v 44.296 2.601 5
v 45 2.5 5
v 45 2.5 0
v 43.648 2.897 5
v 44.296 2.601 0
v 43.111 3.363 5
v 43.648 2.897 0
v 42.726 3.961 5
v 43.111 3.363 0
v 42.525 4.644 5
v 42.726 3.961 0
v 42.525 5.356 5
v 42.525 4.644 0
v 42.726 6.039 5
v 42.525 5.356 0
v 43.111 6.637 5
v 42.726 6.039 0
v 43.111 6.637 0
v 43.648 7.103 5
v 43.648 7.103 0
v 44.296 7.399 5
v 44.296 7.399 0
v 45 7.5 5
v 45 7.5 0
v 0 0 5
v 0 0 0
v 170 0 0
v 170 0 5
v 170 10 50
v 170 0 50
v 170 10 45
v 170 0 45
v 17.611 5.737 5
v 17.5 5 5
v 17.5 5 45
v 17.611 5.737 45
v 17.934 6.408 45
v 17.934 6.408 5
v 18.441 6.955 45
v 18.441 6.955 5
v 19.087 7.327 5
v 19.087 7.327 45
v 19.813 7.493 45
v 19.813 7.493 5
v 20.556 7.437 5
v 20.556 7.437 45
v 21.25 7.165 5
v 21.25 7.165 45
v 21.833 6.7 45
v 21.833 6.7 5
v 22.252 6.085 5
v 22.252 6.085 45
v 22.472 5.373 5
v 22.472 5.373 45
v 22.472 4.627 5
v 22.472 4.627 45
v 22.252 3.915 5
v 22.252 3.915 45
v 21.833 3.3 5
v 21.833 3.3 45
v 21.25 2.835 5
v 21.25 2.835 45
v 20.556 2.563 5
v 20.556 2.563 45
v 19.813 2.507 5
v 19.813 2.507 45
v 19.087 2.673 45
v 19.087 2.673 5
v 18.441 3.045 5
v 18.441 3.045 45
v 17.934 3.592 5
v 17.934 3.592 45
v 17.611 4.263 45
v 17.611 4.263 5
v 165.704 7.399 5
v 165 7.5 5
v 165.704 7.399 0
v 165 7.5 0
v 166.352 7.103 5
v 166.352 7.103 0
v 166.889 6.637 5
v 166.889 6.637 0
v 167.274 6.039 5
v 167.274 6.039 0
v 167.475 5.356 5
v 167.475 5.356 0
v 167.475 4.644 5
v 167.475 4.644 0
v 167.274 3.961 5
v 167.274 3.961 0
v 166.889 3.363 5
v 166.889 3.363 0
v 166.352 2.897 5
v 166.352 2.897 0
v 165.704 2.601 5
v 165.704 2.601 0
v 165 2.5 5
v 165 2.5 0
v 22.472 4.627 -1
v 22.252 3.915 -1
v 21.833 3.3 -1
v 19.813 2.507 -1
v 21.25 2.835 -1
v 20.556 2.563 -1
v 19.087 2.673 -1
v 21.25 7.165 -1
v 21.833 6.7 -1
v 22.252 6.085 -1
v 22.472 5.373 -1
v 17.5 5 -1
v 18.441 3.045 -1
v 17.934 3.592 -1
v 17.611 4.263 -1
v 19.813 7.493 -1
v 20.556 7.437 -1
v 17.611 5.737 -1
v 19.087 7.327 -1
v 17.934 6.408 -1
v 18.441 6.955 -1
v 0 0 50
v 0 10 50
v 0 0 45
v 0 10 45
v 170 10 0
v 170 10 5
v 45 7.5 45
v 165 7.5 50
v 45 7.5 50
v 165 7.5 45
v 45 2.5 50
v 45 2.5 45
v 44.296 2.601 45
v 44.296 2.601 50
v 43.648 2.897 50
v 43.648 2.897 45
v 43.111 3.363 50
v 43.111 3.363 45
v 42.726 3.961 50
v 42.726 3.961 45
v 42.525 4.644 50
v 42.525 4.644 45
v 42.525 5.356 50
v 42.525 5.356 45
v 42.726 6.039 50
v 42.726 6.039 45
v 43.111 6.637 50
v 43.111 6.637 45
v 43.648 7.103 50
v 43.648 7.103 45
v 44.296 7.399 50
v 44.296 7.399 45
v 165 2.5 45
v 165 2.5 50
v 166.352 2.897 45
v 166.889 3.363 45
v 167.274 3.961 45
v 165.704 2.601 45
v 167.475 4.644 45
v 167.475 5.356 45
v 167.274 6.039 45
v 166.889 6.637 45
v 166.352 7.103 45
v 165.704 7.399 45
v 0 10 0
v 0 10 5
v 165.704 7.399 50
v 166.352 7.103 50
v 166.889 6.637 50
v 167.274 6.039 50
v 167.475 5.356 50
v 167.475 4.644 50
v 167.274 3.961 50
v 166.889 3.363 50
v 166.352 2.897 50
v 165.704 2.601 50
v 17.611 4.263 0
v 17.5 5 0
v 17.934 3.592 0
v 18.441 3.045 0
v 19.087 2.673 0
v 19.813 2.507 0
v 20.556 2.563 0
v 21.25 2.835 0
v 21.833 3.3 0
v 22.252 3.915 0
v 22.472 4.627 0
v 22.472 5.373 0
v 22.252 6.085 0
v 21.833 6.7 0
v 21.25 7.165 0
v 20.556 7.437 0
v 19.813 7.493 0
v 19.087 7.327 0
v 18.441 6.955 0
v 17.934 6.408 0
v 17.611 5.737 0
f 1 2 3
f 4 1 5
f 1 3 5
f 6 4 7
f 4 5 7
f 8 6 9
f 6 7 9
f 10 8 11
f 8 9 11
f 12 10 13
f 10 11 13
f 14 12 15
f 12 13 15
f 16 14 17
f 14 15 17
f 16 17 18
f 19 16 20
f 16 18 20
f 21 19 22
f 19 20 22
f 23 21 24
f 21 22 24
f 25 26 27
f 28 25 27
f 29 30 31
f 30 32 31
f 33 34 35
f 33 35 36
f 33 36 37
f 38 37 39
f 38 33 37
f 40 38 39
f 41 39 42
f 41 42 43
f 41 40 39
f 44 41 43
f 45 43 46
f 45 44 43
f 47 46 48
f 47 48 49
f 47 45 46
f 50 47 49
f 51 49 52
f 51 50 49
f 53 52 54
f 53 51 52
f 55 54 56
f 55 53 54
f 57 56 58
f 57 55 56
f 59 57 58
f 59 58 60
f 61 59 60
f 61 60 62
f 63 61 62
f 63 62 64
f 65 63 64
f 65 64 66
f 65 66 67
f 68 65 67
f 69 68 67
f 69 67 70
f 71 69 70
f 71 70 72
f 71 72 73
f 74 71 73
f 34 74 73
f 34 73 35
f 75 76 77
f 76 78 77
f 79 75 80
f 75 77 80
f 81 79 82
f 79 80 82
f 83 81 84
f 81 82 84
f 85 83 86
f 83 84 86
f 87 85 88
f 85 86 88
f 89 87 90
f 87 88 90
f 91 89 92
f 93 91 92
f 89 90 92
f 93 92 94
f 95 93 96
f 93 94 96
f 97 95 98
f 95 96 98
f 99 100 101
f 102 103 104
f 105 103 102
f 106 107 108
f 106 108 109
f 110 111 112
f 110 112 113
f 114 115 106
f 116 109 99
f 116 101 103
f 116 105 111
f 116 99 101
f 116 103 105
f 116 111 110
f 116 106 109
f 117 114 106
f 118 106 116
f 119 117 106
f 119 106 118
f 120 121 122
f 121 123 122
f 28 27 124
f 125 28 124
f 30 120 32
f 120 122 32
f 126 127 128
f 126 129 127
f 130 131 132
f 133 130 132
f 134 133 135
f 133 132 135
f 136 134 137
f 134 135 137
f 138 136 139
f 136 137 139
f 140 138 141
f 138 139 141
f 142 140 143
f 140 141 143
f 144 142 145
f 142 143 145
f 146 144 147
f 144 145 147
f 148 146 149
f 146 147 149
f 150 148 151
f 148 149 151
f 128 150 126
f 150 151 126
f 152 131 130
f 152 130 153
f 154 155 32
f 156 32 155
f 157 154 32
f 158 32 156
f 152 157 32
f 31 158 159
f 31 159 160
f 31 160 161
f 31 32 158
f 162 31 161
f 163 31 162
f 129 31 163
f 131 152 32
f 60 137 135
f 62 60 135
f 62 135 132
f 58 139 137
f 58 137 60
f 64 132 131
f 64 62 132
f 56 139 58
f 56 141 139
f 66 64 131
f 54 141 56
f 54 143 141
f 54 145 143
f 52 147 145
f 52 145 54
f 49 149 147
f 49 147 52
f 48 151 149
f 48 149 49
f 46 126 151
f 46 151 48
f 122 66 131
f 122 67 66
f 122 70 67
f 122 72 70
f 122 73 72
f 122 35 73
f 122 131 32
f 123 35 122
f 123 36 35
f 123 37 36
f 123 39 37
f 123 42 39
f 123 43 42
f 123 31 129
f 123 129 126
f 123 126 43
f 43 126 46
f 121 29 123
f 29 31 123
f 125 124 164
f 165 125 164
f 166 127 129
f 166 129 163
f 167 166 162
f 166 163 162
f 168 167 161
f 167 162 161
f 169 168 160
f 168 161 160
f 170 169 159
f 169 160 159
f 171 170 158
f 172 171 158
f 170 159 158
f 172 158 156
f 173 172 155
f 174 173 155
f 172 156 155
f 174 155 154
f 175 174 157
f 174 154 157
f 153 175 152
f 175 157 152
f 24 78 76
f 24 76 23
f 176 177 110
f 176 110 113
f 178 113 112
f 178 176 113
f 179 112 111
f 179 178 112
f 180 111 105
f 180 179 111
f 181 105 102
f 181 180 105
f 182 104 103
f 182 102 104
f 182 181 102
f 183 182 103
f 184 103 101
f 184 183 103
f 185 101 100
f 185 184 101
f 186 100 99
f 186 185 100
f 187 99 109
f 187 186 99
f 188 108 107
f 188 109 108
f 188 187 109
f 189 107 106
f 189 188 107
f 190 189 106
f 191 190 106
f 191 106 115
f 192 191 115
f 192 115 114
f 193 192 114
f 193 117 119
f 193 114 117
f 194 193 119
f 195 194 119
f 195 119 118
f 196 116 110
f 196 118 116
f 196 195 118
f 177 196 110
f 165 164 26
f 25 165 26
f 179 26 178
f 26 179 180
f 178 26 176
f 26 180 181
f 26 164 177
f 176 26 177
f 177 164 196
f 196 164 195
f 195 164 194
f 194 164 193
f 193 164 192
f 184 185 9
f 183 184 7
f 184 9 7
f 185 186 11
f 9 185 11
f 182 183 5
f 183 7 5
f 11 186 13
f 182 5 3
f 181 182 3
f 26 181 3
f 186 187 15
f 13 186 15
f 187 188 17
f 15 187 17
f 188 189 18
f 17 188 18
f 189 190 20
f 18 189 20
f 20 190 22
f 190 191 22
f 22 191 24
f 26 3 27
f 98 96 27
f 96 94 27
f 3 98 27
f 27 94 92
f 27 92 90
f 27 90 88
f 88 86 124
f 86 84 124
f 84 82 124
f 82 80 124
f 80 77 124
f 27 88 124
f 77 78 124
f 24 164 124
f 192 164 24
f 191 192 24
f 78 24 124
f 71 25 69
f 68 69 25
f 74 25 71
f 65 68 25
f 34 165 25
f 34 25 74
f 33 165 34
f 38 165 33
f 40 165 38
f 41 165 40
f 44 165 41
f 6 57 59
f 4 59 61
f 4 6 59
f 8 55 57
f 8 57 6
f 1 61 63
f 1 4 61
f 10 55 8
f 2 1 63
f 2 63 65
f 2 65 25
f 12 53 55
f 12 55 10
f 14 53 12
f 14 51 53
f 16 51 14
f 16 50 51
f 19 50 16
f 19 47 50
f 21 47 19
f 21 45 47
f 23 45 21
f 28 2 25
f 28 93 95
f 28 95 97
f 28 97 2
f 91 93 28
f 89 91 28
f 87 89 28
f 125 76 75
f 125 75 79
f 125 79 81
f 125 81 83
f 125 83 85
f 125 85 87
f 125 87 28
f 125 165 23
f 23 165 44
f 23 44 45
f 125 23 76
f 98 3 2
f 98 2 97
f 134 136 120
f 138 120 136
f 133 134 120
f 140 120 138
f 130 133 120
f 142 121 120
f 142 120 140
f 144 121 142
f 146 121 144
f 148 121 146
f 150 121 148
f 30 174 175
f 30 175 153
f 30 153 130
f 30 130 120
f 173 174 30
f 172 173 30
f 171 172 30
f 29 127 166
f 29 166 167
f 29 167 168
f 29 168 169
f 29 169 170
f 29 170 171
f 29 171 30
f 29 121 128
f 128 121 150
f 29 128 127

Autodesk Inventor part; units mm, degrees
ref_plane "YZ Plane" through (0, 0, 0) normal (1, 0, 0) x (0, 1, 0)
ref_plane "XZ Plane" through (0, 0, 0) normal (0, 1, 0) x (-1, 0, 0)
ref_plane "XY Plane" through (0, 0, 0) normal (0, 0, 1) x (1, 0, 0)
sketch "Sketch1" plane through (0, 0, 0) normal (0, 0, 1) x (1, 0, 0)
  point P0 (0, 0)
sketch "Sketch2" plane through (0, 0, 0) normal (0, 0, 1) x (1, 0, 0)
  line L0 (0, 0) -> (170, 0)
  line L1 (170, 0) -> (170, 10)
  line L2 (170, 10) -> (0, 10)
  line L3 (0, 10) -> (0, 0)
  circle A0 centre (165, 5) radius 2.5
  circle A1 centre (45, 5) radius 2.5
  line L4 (45, 2.5) -> (165, 2.5)
  line L5 (165, 2.5) -> (165, 7.5)
  line L6 (165, 7.5) -> (45, 7.5)
  line L7 (45, 7.5) -> (45, 2.5)
  point P0 (45, 7.5)
  point P1 (165, 2.5)
  dimension "d4" = 5
  dimension "d5" = 5
  dimension "d0" = 170
  dimension "d1" = 10
  dimension "d2" = 5
  dimension "d3" = 5
  dimension "d6" = 120
  dimension "d7" = 5
  dimension "d8" = 2.5
  dimension "d9" = 2.5
extrude "Extrusion1" add sketch "Sketch2" along normal blind 50
sketch "Sketch3" plane through (0, 10, 0) normal (0, 1, 0) x (1, 0, 0)
  line L0 (170, 0) -> (170, -50) projected
  line L1 (170, -45) -> (-20, -45)
  line L2 (-20, -45) -> (-20, -5)
  line L3 (-20, -5) -> (170, -5)
  line L4 (170, -5) -> (170, -45)
  line L5 (170, -50) -> (0, -50) projected
  line L6 (170, 0) -> (0, 0) projected
  dimension "d12" = 190
  dimension "d13" = 5
  dimension "d14" = 5
extrude "Extrusion2" cut sketch "Sketch3" against normal blind 10
sketch "Sketch4" plane through (0, 0, 0) normal (0, 0, -1) x (-1, 0, 0)
  circle A0 centre (-20, 5) radius 2.5
  line L0 (0, 10) -> (0, 0) projected
  line L1 (0, 0) -> (-170, 0) projected
  dimension "d17" = 20
  dimension "d18" = 5
  dimension "d19" = 5
extrude "Extrusion3" add sketch "Sketch4" along normal blind 1 and the other way blind 50
properties part number "Base"
